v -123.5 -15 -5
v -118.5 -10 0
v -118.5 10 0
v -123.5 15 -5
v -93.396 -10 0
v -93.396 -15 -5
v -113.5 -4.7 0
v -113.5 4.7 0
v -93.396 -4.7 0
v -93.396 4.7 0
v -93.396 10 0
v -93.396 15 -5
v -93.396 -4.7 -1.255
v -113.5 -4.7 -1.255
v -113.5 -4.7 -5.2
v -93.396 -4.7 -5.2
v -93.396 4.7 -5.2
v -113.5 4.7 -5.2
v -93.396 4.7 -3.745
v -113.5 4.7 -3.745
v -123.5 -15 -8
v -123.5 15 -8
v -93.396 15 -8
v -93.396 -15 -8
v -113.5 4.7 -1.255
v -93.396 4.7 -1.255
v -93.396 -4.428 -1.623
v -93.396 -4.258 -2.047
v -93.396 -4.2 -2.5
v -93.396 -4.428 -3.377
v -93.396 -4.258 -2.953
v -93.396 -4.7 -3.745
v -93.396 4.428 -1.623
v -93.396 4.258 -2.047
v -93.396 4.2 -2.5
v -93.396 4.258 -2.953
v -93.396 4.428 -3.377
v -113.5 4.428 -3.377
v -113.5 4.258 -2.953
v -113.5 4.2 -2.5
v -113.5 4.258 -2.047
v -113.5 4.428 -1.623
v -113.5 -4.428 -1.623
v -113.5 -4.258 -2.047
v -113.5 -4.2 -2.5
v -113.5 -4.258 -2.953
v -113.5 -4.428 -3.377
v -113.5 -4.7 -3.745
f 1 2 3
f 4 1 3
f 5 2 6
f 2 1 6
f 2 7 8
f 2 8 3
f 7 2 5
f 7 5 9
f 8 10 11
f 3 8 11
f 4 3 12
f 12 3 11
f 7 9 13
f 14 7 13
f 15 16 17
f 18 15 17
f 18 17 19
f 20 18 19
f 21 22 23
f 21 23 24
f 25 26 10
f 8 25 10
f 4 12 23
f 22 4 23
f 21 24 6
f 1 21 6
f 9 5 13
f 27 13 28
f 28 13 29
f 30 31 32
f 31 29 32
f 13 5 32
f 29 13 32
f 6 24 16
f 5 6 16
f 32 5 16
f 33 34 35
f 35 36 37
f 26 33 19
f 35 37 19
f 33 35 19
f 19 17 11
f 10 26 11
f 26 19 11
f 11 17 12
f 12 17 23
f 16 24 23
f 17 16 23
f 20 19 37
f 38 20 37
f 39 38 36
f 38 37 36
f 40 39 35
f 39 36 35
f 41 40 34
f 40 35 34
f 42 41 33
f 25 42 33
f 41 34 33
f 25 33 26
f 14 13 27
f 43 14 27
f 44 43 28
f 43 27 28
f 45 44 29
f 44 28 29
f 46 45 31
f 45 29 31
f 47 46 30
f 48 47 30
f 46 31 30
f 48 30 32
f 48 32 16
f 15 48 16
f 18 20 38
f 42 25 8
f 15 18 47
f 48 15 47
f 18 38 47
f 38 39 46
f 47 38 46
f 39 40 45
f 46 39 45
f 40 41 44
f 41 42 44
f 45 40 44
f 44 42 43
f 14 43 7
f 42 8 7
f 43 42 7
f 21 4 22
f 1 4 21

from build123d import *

# Parameters (mm, degrees)
F0_W      = 16
F0_H      = 6
F1_DEPTH  = 95
F2_DEPTH  = 5
F3_R      = 2
F4_DEPTH  = 127.001
F5_SIZE   = 0.49999
F6_DEPTH  = 25
F8_DEPTH  = 25
F9_W      = 318.6057507992
F9_H      = 243.2989366353
F10_DEPTH = 19.501
F12_DEPTH = 10
F14_DEPTH = 8.001
F15_SIZE  = 5
F16_SIZE  = 5


# Not quite as in the source:
# - a fillet or chamfer is up to 0.001 mm smaller than in the source, because OpenCascade refuses the exact size


with BuildPart() as f1:
    # F0 (on Top) → F1 (new body)
    with BuildSketch(Plane.XY):
        Polygon((-8, -4.5), (63.5, -4.5), (63.5, 4.5), (-26, 4.5), (-28, 4.5), (-44, 4.5), (-46, 4.5), (-63.5, 4.5), (-63.5, -4.5), (-28, -4.5), (-26, -4.5), (-10, -4.5), align=None)
        with Locations((-54, 0)):
            Rectangle(F0_W, F0_H, mode=Mode.SUBTRACT)
        with Locations((-36, 0)):
            Rectangle(F0_W, F0_H, mode=Mode.SUBTRACT)
        with Locations((-18, 0)):
            Rectangle(F0_W, F0_H, mode=Mode.SUBTRACT)
        Rectangle(F0_W, F0_H, mode=Mode.SUBTRACT)
        with Locations((18, 0)):
            Rectangle(F0_W, F0_H, mode=Mode.SUBTRACT)
        with Locations((36, 0)):
            Rectangle(F0_W, F0_H, mode=Mode.SUBTRACT)
        with Locations((54, 0)):
            Rectangle(F0_W, F0_H, mode=Mode.SUBTRACT)
    extrude(amount=F1_DEPTH)

    # F0 (on Top) → F2 (join)
    with BuildSketch(Plane.XY):
        Polygon((-8, -4.5), (63.5, -4.5), (63.5, 4.5), (-26, 4.5), (-28, 4.5), (-44, 4.5), (-46, 4.5), (-63.5, 4.5), (-63.5, -4.5), (-28, -4.5), (-26, -4.5), (-10, -4.5), align=None)
        with Locations((-54, 0)):
            Rectangle(F0_W, F0_H, mode=Mode.SUBTRACT)
        with Locations((-36, 0)):
            Rectangle(F0_W, F0_H, mode=Mode.SUBTRACT)
        with Locations((-18, 0)):
            Rectangle(F0_W, F0_H, mode=Mode.SUBTRACT)
        Rectangle(F0_W, F0_H, mode=Mode.SUBTRACT)
        with Locations((18, 0)):
            Rectangle(F0_W, F0_H, mode=Mode.SUBTRACT)
        with Locations((36, 0)):
            Rectangle(F0_W, F0_H, mode=Mode.SUBTRACT)
        with Locations((54, 0)):
            Rectangle(F0_W, F0_H, mode=Mode.SUBTRACT)
        with Locations((-54, 0)):
            Rectangle(F0_W, F0_H)
        with Locations((-36, 0)):
            Rectangle(F0_W, F0_H)
        with Locations((-18, 0)):
            Rectangle(F0_W, F0_H)
        Rectangle(F0_W, F0_H)
        with Locations((18, 0)):
            Rectangle(F0_W, F0_H)
        with Locations((36, 0)):
            Rectangle(F0_W, F0_H)
        with Locations((54, 0)):
            Rectangle(F0_W, F0_H)
    extrude(amount=-F2_DEPTH)

    # F3 (on face) → F4 (cut, through all)
    with BuildSketch(Plane(origin=(-63.5, 0, 0), x_dir=(0, -1, 0), z_dir=(-1, 0, 0))):
        with Locations((-6, -2.5)):
            Circle(F3_R)
        with Locations((6, -2.5)):
            Circle(F3_R)
    extrude(amount=-F4_DEPTH, mode=Mode.SUBTRACT)

    # F5 (size 0.5 in the source; OpenCascade refuses exactly that, so slightly less here)
    f5_edges = [f1.edges().sort_by_distance(p)[0] for p in [
        (-63.5, 4.5, 46.911438),
        (-63.5, -4.5, 46.911438),
        (0, 4.5, -5),
        (-63.5, 0, -5),
        (-63.5, 4, -2.5),
        (0, 4.5, 95),
        (-63.5, 0, 95),
        (0, -4.5, 95),
        (63.5, 0, 95),
        (63.5, 0, -5),
        (63.5, 4.5, 46.911438),
        (63.5, -4.5, 46.911438),
        (-63.5, -4, -2.5),
        (63.5, 4, -2.5),
        (63.5, -4, -2.5),
        (54, -3, 95),
        (46, 0, 95),
        (54, 3, 95),
        (62, 0, 95),
        (44, 0, 95),
        (36, 3, 95),
        (36, -3, 95),
        (8, 0, 95),
        (10, 0, 95),
        (18, 3, 95),
        (18, -3, 95),
        (26, 0, 95),
        (28, 0, 95),
        (0, 3, 95),
        (0, -3, 95),
        (-8, 0, 95),
        (-10, 0, 95),
        (-18, -3, 95),
        (-26, 0, 95),
        (-18, 3, 95),
        (-36, 3, 95),
        (-28, 0, 95),
        (-36, -3, 95),
        (-54, 3, 95),
        (-62, 0, 95),
        (-54, -3, 95),
        (-46, 0, 95),
        (-44, 0, 95),
    ]]
    chamfer(f5_edges, length=F5_SIZE)

    # F3 (on face) → F6 (join)
    with BuildSketch(Plane(origin=(-63.5, 0, 0), x_dir=(0, -1, 0), z_dir=(-1, 0, 0))):
        with BuildLine():
            ThreePointArc((-4.5, -1.1771243445), (-4.1291713066, -1.7928932188), (-4, -2.5))
            ThreePointArc((-4, -2.5), (-4.1291713066, -3.2071067812), (-4.5, -3.8228756555))
            Line((-4.5, -3.8228756555), (-4.5, -5))
            Line((-4.5, -5), (4.5, -5))
            Line((4.5, -5), (4.5, -3.8228756555))
            ThreePointArc((4.5, -3.8228756555), (4, -2.5), (4.5, -1.1771243445))
            Line((4.5, -1.1771243445), (4.5, 95))
            Line((4.5, 95), (-4.5, 95))
            Line((-4.5, 95), (-4.5, -1.1771243445))
        make_face()
    extrude(amount=F6_DEPTH)


with BuildPart() as f8:
    # F7 (on face) → F8 (new body)
    with BuildSketch(Plane(origin=(-88.5, 0, 0), x_dir=(0, -1, 0), z_dir=(-1, 0, 0))):
        with BuildLine():
            Line((15, 0), (4.7, 0))
            Line((4.7, 0), (4.7, -1.2550100402))
            ThreePointArc((4.7, -1.2550100402), (4.2, -2.5), (4.7, -3.7449899598))
            Line((4.7, -3.7449899598), (4.7, -5.2))
            Line((4.7, -5.2), (-4.7, -5.2))
            Line((-4.7, -5.2), (-4.7, -3.7449899598))
            ThreePointArc((-4.7, -3.7449899598), (-4.2, -2.5), (-4.7, -1.2550100402))
            Line((-4.7, -1.2550100402), (-4.7, 0))
            Line((-4.7, 0), (-15, 0))
            Line((-15, 0), (-15, -8))
            Line((-15, -8), (15, -8))
            Line((15, -8), (15, 0))
        make_face()
    extrude(amount=F8_DEPTH)


with BuildPart() as f10_tool:
    # F9 (on face) → F10 (new body, through all)
    with BuildSketch(Plane(origin=(0, 4.5, 0), x_dir=(-1, 0, 0), z_dir=(0, 1, 0))):
        with Locations((-68.3380588889, 100.3342196345)):
            Rectangle(F9_W, F9_H)
    extrude(amount=-F10_DEPTH)


with BuildPart() as f1_1:
    add(f1.part)

    # F10: cut by f10_tool
    add(f10_tool.part, mode=Mode.SUBTRACT)


with BuildPart() as f8_1:
    add(f8.part)

    # F10: cut by f10_tool
    add(f10_tool.part, mode=Mode.SUBTRACT)

    # F11 (on face) → F12 (join)
    with BuildSketch(Plane(origin=(-113.5, 0, 0), x_dir=(0, -1, 0), z_dir=(-1, 0, 0))):
        with BuildLine():
            Line((-4.7, -1.2550100402), (-4.7, 0))
            Line((-4.7, 0), (-15, 0))
            Line((-15, 0), (-15, -8))
            Line((-15, -8), (15, -8))
            Line((15, -8), (15, 0))
            Line((15, 0), (4.7, 0))
            Line((4.7, 0), (4.7, -1.2550100402))
            ThreePointArc((4.7, -1.2550100402), (4.2, -2.5), (4.7, -3.7449899598))
            Line((4.7, -3.7449899598), (4.7, -5.2))
            Line((4.7, -5.2), (-4.7, -5.2))
            Line((-4.7, -5.2), (-4.7, -3.7449899598))
            ThreePointArc((-4.7, -3.7449899598), (-4.2, -2.5), (-4.7, -1.2550100402))
        make_face()
        with BuildLine():
            Line((4.7, 0), (-4.7, 0))
            Line((-4.7, 0), (-4.7, -1.2550100402))
            ThreePointArc((-4.7, -1.2550100402), (-4.2, -2.5), (-4.7, -3.7449899598))
            Line((-4.7, -3.7449899598), (-4.7, -5.2))
            Line((-4.7, -5.2), (4.7, -5.2))
            Line((4.7, -5.2), (4.7, -3.7449899598))
            ThreePointArc((4.7, -3.7449899598), (4.2, -2.5), (4.7, -1.2550100402))
            Line((4.7, -1.2550100402), (4.7, 0))
        make_face()
    extrude(amount=F12_DEPTH)

    # F13 (on face) → F14 (cut, through all)
    with BuildSketch(Plane(origin=(0, 0, -8), x_dir=(1, 0, 0), z_dir=(0, 0, -1))):
        Polygon((-93.395665288, -19.6107532829), (-75.3739327192, -19.6107532829), (-75.3739327192, 58.0060165375), (-93.395665288, 58.0060165375), (-93.395665288, 15), (-90.9648165107, 15), (-90.9648165107, -4.5), (-88.5, -4.5), (-88.5, -15), (-93.395665288, -15), align=None)
        Polygon((-93.395665288, 15), (-93.395665288, -15), (-88.5, -15), (-88.5, -4.5), (-90.9648165107, -4.5), (-90.9648165107, 15), align=None)
    extrude(amount=-F14_DEPTH, mode=Mode.SUBTRACT)

    # F15
    f15_edges = [f8_1.edges().sort_by_distance(p)[0] for p in [
        (-108.447833, 15, 0),
        (-108.447833, -15, 0),
    ]]
    chamfer(f15_edges, length=F15_SIZE)

    # F16
    f16_edges = [f8_1.edges().sort_by_distance(p)[0] for p in [
        (-123.5, 0, 0),
    ]]
    chamfer(f16_edges, length=F16_SIZE)


solid = f8_1.part
